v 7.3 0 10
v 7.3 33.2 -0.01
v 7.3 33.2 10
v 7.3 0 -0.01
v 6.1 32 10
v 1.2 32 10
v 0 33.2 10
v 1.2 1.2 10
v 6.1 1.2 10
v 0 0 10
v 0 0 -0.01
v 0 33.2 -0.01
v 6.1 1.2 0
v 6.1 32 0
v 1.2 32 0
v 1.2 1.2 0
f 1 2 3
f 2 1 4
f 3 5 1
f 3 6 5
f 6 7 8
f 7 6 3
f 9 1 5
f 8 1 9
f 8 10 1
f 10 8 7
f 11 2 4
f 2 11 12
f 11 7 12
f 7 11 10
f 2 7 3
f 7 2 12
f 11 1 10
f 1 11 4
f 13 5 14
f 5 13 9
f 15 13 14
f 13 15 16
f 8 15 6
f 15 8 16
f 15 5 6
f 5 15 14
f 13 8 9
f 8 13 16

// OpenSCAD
// file: ../Base/Boxes.scad
// Fischertechnik Box Foundation
// Pre-designed Boxes

use <Constants.scad>

include <PlacementOptions.scad>

box190Width = 190;
box190Depth = 130;
box130Width = 130;
box130Depth = 95;
boxUsageHeight = 33.9;
boxWallThickness = 2.4;
boxBaseThickness = 1.0;
boxWebWidth = 3.0;

// getBoxWallThickness()
// Gets the wall thickness of a Fischertechnik Box

function getBoxWallThickness() = boxWallThickness;

// Gets the usable height of a fischertechnik box
function getBoxUsageHeight() = boxUsageHeight;

// Gets the thickness of the Fischertechnik box base.
function getBoxBaseThickness() = boxBaseThickness;

// Gets the width of a box web
function getBoxWebWidth() = boxWebWidth;

// Gets the usable inner space of a Box 190 as an x/y-list
function getBox190Space() = [
    box190Width - 2*getBoxWallThickness(), 
    box190Depth - 2*getBoxWallThickness() ];

// Imports the Fischertechnik empty box 130x190 mm and places it at position 0,0
// 190x130 are the outer sizes, the inner space is slightly smaller. Use getBox190Space() to get the inner sizes.
// This module needs the STL file "Fischertechnik Box 130x190.stl" in the library path.
// The box is positioned that the usable inner space is at the 0,0,0 position. The

module Box190() {
    translate([-getBoxWallThickness(),-getBoxWallThickness(),-getBoxBaseThickness()])
        import("Fischertechnik Box 130x190.stl", convexity=3);
}

// Gets the usable inner space of a Box 130 as an x/y-list
function getBox130Space() = [
    box130Width - 2*getBoxWallThickness(), 
    box130Depth - 2*getBoxWallThickness() ];

// Imports the Fischertechnik empty box 95x130 mm and places it at position 0,0
// 190x130 are the outer sizes, the inner space is slightly smaller. Use getBox190Space() to get the inner sizes.
// This module needs the STL file "Fischertechnik Box 95x130.stl" in the library path.
// The box is positioned that the usable inner space is at the 0,0,0 position. The

module Box130() {
    translate([-getBoxWallThickness(),-getBoxWallThickness(),-getBoxBaseThickness()])
        import("Fischertechnik Box 95x130.stl", convexity=3);
}

// Creates a web at the specified box walls
// corner 0 = LowerLeft, 1 = UpperLeft, 2 = UpperRight, 3 = LowerRight
// side 0 = LeftOfCorner, 1 = RightOfCorner
// distance = Distance in mm from the corner
// box = inner width and depth of the box (default: Box 190)
// webWidth = length of the web (default is 3 mms)
// webThickness = thickness of the web (default is 1 mm)

module BoxWeb(corner, side, distance, box=getBox190Space(), webWidth=getBoxWebWidth(), webThickness=1.0) {
    sink = getBoxWallThickness()/2;

    width = (corner % 2 == 0) ? 
            (side == LeftOfCorner ? webWidth : webThickness) :
            (side == LeftOfCorner ? webThickness : webWidth);

    depth = (corner % 2 == 0) ? 
            (side == RightOfCorner ? webWidth : webThickness) :
            (side == RightOfCorner ? webThickness : webWidth);
    
    xDiff = corner == LowerLeft ? 
                (side == LeftOfCorner ? -sink : distance) :
            (corner == UpperLeft ?                
                (side == LeftOfCorner ? distance : -sink) :
            (corner == UpperRight ?
                (side == LeftOfCorner ? box.x-webWidth+sink : box.x-distance-webThickness) :
                (side == LeftOfCorner ? box.x-distance-webThickness: box.x-webWidth+sink)));

    yDiff = corner == LowerLeft ? 
                (side == RightOfCorner ? -sink : distance) :
            (corner == UpperLeft ?
                (side == RightOfCorner ? box.y-distance : box.y-webWidth+sink) :
            (corner == UpperRight ?
                (side == RightOfCorner ? box.y-webWidth+sink : box.y-distance) :
                (side == RightOfCorner ? distance : -sink)));
    
    translate([xDiff, yDiff, -getExcess()])
        cube([width, depth, boxUsageHeight + 2*getExcess()]);
}
// file: ../Base/Rotation.scad
// Fischertechnik Box Foundation
// Geometry Helpers Rotation

include <PlacementOptions.scad>

// getRotatedSpace(space, rotation=NoRotation)
// Rotates the space dependent on the specified rotation

function getRotatedSpace(space, rotation=NoRotation) = [
    (rotation == Rotate90 || rotation == Rotate270) ? space.y : space.x,
    (rotation == Rotate90 || rotation == Rotate270) ? space.x : space.y
];

// Rotates the given space around the fixed left lower corner
// space = the space the children needs as width/depth list [width,depth]
// rotation = 0 Rotate0 degrees, 1 Rotate90 degrees, 2 Rotate180 degrees, 3 Rotate270 degrees (equivalent to -90)

module RotateFix(space, rotation=Rotate0) {
    dy = (rotation == Rotate0 || rotation == Rotate270) ? 0 :
        (rotation == Rotate90) ? space.x :
        space.y;
    dx = (rotation < Rotate180) ? 0 :
        (rotation == Rotate180) ? space.x :
        space.y;
    
    translate([dx, dy, 0])
        rotate([0, 0, rotations[rotation]])
            children();
}
// file: ../Base/Alignment.scad
// Fischertechnik Box Foundation
// Geometry Helpers Alignment

include <PlacementOptions.scad>

// getAlignedX(elementWidth, spaceWidth, align=AlignRight, offset=0)
// Gets the aligned X offset of an element with the given
// width in the given space.
// elementWidth = The width of the element to positon
// spaceWidth = The space where the element should be aligned
// align = 0 AlignLeft, 1 AlignCenter, 2 AlignRight
// offset = an optional offset from the aligned position. When
// aligned left or centered, then positive values are in X direction.
// When aligned right then positive values are in negative X direction.

function getAlignedX(elementWidth, spaceWidth, align=AlignRight, offset=0) =
    (align == AlignLeft) ?
        offset :
        ((align == AlignCenter) ?
        (spaceWidth - elementWidth)/2 + offset :
        spaceWidth - offset - elementWidth);

// getAlignedY(elementDepth, spaceDepth, align=AlignTop, offset=0)
// Gets the aligned Y offset of an element with the given
// depth in the given space.
// elementDepth = The depth of the element to positon
// spaceDepth = The space where the element should be aligned
// align = 0 AlignBottom, 1 AlignCenter, 2 AlignTop
// offset = an optional offset from the aligned position. When
// aligned bottom or centered, then positive values are in Y direction.
// When aligned top then positive values are in negative Y direction.

function getAlignedY(elementDepth, spaceDepth, align=AlignTop, offset=0) =
    (align == AlignBottom) ?
        offset :
        ((align == AlignCenter) ?
        (spaceDepth - elementDepth)/2 + offset :
        spaceDepth - offset - elementDepth);
// file: ../Base/PlacementOptions.scad
// Fischertechnik Box Foundation
// Placement Options

// Alignment
NoAlign = 0;
AlignLeft = 1;
AlignBottom = 2;
AlignCenter = 3;
AlignRight = 4;
AlignTop = 5;

// Element rotation degree steps
rotations = [0, -90, -180, -270];

// Rotation
NoRotation = 0;
Rotate0 = 0;
Rotate90 = 1;
Rotate180 = 2;
Rotate270 = 3;

// Docking (seen from above)
NoDock = -1;
DockLeft = 0;
DockTop = 1;
DockRight = 2;
DockCorner = 2;
DockBottom = 3;

// Web corners
LowerLeft = 0;
UpperLeft = 1;
UpperRight = 2;
LowerRight = 3;

// Web position relative to corner
LeftOfCorner = 0;
RightOfCorner = 1;
// file: ../Base/Placement.scad
// Fischertechnik Box Foundation
// Geometry Helpers Placement

use <Constants.scad>
use <Alignment.scad>
use <Rotation.scad>
use <Boxes.scad>

include <PlacementOptions.scad>

// Place(x=0, y=0, elementSpace=[0,0], alignX=AlignLeft, alignY=AlignBottom, rotation=Rotate0, boxSpace=getBox190Space())
// Places the child at the specified position
// y = Y-Position. This is a relative position when an X aligment is specified.
// x = X-Position. This is a relative position when an Y aligment is specified.
// elementSpace = space of the element to be placed [x,y]
// alignX = -1=NoAlign, 0 AlignLeft, 1 AlignCenter, 3 AlignRight (elementSpace and boxSpace required!)
// alignY = -1=NoAlign, 2 AlignBottom, 1 AlignCenter, 4 AlignTop (elementSpace and boxSpace required!)
// rotation = 0 Rotate0 0 degrees, 1 Rotate90 90 degrees, 
// 2 Rotate180 180 degrees, 3 Rotate270 270 degrees (equivalent to -90)
// boxSpace = Inner space of the box where the placement occurs [x,y] - default is Box 190x130 inner space

module Place(x=0, y=0, elementSpace=[0,0], 
  alignX=AlignLeft, alignY=AlignBottom, 
  rotation=NoRotation, boxSpace=getBox190Space()) {

    module Position(x, y, space, rotation=Rotate0) {
        translate([x, y, 0])
            RotateFix(space, rotation)
                children();
    }

    space = getRotatedSpace(elementSpace, rotation);
    alignedX = getAlignedX(space.x, boxSpace.x, alignX, x);
    alignedY = getAlignedY(space.y, boxSpace.y, alignY, y);
    Position(alignedX, alignedY, elementSpace, rotation)
        children();
}

// Center(space=getBox130Space(), elementSpace=[0,0])
// space = Space where the children is centered. For cylinder use centered=true and no elementSpace.
// elementSpace = space of the element to be centered [x,y]

module Center(space=getBox190Space(), elementSpace=[0,0]) {
    translate([(space.x - elementSpace.x) / 2, (space.y - elementSpace.y) / 2])
        children(0);
}

// CenterHorizontal(width=0, y=0, offset=0, space=getBox130Space())
// space = Space where the children is centered. For cylinder use centered=true and no elementSpace.
// elementSpace = space of the element to be centered [x,y]

module CenterHorizontal(width=0, y=0, offset=0, space=getBox190Space()) {
    translate([(space.x - width) / 2 + offset, y])
        children(0);
}

// CenterVertical(depth=0, x=0, offset=0, space=getBox130Space())
// space = Space where the children is centered. For cylinder use centered=true and no elementSpace.
// elementSpace = space of the element to be centered [x,y]

module CenterVertical(depth=0, x=0, offset=0, space=getBox190Space()) {
    translate([x, (space.y - depth) / 2 + offset])
        children(0);
}
// file: ../Base/Constants.scad
// Fischertechnik Box Foundation
// Constants

// Constant values necessary for multiple elements

// Base constants
dividerThickness = 1.2;
excess = 0.01;
fragments = 90;
tolerance = 0.8;

// Gets the thickness of a divider 
function getDividerThickness() = dividerThickness;

// Gets the excess that is used to merge walls into each other
function getExcess() = excess;

// Gets amount of fragments of a cylinder
function getFragments() = fragments;

// Gets the inner tolerance of a frame to each side
function getTolerance() = tolerance;


// Fischertechnik specific constants
axisDiameter = 4;
axisBottomDiameter = axisDiameter + 1;
standardEdgeDistance = 2.5;
standardWebDistance = 11.5;
standardCornerLength = 15;
tubeWallFactor = 0.8;

// Gets axis diameter
function getAxisDiameter() = axisDiameter;

// Gets axis bottom diameter for thicker part at the bottom
function getAxisBottomDiameter() = axisBottomDiameter;

// gets the standard distance to the wall of the box for dockable frames with webs
function getStandardEdgeDistance() = standardEdgeDistance;

// gets the standard distance of each web to the corner of the dockable frame
function getStandardWebDistance() = standardWebDistance;

// gets the standard length of the corner walls of a dockable frame
function getStandardCornerLength() = standardCornerLength;

// gets the wall thickness of a tube.
function getTubeWallThickness() = tubeWallFactor * getDividerThickness();
// main file
// Fischertechnik Box Library
// Frame for Flat Pieces 30
// 31013

use <../Base/Constants.scad>
use <../ModelBase/Complex.scad>

size = 30;

// getFrameFlatPiece30Space(count)
// count = count of pieces in X direction
// Gets the space for a frame for flat pieces 30.

function getFrameFlatPiece30Space(count=1) = getFrameFlatPieceVolume(count, size);

// FrameFlatPiece30(count)
// count = Count of flat pieces 30 in X direction

module FrameFlatPiece30(count=1) {  
    FrameFlatPiece(count, size);
}

// Tests
color("lightgray") {
FrameFlatPiece30();
}
